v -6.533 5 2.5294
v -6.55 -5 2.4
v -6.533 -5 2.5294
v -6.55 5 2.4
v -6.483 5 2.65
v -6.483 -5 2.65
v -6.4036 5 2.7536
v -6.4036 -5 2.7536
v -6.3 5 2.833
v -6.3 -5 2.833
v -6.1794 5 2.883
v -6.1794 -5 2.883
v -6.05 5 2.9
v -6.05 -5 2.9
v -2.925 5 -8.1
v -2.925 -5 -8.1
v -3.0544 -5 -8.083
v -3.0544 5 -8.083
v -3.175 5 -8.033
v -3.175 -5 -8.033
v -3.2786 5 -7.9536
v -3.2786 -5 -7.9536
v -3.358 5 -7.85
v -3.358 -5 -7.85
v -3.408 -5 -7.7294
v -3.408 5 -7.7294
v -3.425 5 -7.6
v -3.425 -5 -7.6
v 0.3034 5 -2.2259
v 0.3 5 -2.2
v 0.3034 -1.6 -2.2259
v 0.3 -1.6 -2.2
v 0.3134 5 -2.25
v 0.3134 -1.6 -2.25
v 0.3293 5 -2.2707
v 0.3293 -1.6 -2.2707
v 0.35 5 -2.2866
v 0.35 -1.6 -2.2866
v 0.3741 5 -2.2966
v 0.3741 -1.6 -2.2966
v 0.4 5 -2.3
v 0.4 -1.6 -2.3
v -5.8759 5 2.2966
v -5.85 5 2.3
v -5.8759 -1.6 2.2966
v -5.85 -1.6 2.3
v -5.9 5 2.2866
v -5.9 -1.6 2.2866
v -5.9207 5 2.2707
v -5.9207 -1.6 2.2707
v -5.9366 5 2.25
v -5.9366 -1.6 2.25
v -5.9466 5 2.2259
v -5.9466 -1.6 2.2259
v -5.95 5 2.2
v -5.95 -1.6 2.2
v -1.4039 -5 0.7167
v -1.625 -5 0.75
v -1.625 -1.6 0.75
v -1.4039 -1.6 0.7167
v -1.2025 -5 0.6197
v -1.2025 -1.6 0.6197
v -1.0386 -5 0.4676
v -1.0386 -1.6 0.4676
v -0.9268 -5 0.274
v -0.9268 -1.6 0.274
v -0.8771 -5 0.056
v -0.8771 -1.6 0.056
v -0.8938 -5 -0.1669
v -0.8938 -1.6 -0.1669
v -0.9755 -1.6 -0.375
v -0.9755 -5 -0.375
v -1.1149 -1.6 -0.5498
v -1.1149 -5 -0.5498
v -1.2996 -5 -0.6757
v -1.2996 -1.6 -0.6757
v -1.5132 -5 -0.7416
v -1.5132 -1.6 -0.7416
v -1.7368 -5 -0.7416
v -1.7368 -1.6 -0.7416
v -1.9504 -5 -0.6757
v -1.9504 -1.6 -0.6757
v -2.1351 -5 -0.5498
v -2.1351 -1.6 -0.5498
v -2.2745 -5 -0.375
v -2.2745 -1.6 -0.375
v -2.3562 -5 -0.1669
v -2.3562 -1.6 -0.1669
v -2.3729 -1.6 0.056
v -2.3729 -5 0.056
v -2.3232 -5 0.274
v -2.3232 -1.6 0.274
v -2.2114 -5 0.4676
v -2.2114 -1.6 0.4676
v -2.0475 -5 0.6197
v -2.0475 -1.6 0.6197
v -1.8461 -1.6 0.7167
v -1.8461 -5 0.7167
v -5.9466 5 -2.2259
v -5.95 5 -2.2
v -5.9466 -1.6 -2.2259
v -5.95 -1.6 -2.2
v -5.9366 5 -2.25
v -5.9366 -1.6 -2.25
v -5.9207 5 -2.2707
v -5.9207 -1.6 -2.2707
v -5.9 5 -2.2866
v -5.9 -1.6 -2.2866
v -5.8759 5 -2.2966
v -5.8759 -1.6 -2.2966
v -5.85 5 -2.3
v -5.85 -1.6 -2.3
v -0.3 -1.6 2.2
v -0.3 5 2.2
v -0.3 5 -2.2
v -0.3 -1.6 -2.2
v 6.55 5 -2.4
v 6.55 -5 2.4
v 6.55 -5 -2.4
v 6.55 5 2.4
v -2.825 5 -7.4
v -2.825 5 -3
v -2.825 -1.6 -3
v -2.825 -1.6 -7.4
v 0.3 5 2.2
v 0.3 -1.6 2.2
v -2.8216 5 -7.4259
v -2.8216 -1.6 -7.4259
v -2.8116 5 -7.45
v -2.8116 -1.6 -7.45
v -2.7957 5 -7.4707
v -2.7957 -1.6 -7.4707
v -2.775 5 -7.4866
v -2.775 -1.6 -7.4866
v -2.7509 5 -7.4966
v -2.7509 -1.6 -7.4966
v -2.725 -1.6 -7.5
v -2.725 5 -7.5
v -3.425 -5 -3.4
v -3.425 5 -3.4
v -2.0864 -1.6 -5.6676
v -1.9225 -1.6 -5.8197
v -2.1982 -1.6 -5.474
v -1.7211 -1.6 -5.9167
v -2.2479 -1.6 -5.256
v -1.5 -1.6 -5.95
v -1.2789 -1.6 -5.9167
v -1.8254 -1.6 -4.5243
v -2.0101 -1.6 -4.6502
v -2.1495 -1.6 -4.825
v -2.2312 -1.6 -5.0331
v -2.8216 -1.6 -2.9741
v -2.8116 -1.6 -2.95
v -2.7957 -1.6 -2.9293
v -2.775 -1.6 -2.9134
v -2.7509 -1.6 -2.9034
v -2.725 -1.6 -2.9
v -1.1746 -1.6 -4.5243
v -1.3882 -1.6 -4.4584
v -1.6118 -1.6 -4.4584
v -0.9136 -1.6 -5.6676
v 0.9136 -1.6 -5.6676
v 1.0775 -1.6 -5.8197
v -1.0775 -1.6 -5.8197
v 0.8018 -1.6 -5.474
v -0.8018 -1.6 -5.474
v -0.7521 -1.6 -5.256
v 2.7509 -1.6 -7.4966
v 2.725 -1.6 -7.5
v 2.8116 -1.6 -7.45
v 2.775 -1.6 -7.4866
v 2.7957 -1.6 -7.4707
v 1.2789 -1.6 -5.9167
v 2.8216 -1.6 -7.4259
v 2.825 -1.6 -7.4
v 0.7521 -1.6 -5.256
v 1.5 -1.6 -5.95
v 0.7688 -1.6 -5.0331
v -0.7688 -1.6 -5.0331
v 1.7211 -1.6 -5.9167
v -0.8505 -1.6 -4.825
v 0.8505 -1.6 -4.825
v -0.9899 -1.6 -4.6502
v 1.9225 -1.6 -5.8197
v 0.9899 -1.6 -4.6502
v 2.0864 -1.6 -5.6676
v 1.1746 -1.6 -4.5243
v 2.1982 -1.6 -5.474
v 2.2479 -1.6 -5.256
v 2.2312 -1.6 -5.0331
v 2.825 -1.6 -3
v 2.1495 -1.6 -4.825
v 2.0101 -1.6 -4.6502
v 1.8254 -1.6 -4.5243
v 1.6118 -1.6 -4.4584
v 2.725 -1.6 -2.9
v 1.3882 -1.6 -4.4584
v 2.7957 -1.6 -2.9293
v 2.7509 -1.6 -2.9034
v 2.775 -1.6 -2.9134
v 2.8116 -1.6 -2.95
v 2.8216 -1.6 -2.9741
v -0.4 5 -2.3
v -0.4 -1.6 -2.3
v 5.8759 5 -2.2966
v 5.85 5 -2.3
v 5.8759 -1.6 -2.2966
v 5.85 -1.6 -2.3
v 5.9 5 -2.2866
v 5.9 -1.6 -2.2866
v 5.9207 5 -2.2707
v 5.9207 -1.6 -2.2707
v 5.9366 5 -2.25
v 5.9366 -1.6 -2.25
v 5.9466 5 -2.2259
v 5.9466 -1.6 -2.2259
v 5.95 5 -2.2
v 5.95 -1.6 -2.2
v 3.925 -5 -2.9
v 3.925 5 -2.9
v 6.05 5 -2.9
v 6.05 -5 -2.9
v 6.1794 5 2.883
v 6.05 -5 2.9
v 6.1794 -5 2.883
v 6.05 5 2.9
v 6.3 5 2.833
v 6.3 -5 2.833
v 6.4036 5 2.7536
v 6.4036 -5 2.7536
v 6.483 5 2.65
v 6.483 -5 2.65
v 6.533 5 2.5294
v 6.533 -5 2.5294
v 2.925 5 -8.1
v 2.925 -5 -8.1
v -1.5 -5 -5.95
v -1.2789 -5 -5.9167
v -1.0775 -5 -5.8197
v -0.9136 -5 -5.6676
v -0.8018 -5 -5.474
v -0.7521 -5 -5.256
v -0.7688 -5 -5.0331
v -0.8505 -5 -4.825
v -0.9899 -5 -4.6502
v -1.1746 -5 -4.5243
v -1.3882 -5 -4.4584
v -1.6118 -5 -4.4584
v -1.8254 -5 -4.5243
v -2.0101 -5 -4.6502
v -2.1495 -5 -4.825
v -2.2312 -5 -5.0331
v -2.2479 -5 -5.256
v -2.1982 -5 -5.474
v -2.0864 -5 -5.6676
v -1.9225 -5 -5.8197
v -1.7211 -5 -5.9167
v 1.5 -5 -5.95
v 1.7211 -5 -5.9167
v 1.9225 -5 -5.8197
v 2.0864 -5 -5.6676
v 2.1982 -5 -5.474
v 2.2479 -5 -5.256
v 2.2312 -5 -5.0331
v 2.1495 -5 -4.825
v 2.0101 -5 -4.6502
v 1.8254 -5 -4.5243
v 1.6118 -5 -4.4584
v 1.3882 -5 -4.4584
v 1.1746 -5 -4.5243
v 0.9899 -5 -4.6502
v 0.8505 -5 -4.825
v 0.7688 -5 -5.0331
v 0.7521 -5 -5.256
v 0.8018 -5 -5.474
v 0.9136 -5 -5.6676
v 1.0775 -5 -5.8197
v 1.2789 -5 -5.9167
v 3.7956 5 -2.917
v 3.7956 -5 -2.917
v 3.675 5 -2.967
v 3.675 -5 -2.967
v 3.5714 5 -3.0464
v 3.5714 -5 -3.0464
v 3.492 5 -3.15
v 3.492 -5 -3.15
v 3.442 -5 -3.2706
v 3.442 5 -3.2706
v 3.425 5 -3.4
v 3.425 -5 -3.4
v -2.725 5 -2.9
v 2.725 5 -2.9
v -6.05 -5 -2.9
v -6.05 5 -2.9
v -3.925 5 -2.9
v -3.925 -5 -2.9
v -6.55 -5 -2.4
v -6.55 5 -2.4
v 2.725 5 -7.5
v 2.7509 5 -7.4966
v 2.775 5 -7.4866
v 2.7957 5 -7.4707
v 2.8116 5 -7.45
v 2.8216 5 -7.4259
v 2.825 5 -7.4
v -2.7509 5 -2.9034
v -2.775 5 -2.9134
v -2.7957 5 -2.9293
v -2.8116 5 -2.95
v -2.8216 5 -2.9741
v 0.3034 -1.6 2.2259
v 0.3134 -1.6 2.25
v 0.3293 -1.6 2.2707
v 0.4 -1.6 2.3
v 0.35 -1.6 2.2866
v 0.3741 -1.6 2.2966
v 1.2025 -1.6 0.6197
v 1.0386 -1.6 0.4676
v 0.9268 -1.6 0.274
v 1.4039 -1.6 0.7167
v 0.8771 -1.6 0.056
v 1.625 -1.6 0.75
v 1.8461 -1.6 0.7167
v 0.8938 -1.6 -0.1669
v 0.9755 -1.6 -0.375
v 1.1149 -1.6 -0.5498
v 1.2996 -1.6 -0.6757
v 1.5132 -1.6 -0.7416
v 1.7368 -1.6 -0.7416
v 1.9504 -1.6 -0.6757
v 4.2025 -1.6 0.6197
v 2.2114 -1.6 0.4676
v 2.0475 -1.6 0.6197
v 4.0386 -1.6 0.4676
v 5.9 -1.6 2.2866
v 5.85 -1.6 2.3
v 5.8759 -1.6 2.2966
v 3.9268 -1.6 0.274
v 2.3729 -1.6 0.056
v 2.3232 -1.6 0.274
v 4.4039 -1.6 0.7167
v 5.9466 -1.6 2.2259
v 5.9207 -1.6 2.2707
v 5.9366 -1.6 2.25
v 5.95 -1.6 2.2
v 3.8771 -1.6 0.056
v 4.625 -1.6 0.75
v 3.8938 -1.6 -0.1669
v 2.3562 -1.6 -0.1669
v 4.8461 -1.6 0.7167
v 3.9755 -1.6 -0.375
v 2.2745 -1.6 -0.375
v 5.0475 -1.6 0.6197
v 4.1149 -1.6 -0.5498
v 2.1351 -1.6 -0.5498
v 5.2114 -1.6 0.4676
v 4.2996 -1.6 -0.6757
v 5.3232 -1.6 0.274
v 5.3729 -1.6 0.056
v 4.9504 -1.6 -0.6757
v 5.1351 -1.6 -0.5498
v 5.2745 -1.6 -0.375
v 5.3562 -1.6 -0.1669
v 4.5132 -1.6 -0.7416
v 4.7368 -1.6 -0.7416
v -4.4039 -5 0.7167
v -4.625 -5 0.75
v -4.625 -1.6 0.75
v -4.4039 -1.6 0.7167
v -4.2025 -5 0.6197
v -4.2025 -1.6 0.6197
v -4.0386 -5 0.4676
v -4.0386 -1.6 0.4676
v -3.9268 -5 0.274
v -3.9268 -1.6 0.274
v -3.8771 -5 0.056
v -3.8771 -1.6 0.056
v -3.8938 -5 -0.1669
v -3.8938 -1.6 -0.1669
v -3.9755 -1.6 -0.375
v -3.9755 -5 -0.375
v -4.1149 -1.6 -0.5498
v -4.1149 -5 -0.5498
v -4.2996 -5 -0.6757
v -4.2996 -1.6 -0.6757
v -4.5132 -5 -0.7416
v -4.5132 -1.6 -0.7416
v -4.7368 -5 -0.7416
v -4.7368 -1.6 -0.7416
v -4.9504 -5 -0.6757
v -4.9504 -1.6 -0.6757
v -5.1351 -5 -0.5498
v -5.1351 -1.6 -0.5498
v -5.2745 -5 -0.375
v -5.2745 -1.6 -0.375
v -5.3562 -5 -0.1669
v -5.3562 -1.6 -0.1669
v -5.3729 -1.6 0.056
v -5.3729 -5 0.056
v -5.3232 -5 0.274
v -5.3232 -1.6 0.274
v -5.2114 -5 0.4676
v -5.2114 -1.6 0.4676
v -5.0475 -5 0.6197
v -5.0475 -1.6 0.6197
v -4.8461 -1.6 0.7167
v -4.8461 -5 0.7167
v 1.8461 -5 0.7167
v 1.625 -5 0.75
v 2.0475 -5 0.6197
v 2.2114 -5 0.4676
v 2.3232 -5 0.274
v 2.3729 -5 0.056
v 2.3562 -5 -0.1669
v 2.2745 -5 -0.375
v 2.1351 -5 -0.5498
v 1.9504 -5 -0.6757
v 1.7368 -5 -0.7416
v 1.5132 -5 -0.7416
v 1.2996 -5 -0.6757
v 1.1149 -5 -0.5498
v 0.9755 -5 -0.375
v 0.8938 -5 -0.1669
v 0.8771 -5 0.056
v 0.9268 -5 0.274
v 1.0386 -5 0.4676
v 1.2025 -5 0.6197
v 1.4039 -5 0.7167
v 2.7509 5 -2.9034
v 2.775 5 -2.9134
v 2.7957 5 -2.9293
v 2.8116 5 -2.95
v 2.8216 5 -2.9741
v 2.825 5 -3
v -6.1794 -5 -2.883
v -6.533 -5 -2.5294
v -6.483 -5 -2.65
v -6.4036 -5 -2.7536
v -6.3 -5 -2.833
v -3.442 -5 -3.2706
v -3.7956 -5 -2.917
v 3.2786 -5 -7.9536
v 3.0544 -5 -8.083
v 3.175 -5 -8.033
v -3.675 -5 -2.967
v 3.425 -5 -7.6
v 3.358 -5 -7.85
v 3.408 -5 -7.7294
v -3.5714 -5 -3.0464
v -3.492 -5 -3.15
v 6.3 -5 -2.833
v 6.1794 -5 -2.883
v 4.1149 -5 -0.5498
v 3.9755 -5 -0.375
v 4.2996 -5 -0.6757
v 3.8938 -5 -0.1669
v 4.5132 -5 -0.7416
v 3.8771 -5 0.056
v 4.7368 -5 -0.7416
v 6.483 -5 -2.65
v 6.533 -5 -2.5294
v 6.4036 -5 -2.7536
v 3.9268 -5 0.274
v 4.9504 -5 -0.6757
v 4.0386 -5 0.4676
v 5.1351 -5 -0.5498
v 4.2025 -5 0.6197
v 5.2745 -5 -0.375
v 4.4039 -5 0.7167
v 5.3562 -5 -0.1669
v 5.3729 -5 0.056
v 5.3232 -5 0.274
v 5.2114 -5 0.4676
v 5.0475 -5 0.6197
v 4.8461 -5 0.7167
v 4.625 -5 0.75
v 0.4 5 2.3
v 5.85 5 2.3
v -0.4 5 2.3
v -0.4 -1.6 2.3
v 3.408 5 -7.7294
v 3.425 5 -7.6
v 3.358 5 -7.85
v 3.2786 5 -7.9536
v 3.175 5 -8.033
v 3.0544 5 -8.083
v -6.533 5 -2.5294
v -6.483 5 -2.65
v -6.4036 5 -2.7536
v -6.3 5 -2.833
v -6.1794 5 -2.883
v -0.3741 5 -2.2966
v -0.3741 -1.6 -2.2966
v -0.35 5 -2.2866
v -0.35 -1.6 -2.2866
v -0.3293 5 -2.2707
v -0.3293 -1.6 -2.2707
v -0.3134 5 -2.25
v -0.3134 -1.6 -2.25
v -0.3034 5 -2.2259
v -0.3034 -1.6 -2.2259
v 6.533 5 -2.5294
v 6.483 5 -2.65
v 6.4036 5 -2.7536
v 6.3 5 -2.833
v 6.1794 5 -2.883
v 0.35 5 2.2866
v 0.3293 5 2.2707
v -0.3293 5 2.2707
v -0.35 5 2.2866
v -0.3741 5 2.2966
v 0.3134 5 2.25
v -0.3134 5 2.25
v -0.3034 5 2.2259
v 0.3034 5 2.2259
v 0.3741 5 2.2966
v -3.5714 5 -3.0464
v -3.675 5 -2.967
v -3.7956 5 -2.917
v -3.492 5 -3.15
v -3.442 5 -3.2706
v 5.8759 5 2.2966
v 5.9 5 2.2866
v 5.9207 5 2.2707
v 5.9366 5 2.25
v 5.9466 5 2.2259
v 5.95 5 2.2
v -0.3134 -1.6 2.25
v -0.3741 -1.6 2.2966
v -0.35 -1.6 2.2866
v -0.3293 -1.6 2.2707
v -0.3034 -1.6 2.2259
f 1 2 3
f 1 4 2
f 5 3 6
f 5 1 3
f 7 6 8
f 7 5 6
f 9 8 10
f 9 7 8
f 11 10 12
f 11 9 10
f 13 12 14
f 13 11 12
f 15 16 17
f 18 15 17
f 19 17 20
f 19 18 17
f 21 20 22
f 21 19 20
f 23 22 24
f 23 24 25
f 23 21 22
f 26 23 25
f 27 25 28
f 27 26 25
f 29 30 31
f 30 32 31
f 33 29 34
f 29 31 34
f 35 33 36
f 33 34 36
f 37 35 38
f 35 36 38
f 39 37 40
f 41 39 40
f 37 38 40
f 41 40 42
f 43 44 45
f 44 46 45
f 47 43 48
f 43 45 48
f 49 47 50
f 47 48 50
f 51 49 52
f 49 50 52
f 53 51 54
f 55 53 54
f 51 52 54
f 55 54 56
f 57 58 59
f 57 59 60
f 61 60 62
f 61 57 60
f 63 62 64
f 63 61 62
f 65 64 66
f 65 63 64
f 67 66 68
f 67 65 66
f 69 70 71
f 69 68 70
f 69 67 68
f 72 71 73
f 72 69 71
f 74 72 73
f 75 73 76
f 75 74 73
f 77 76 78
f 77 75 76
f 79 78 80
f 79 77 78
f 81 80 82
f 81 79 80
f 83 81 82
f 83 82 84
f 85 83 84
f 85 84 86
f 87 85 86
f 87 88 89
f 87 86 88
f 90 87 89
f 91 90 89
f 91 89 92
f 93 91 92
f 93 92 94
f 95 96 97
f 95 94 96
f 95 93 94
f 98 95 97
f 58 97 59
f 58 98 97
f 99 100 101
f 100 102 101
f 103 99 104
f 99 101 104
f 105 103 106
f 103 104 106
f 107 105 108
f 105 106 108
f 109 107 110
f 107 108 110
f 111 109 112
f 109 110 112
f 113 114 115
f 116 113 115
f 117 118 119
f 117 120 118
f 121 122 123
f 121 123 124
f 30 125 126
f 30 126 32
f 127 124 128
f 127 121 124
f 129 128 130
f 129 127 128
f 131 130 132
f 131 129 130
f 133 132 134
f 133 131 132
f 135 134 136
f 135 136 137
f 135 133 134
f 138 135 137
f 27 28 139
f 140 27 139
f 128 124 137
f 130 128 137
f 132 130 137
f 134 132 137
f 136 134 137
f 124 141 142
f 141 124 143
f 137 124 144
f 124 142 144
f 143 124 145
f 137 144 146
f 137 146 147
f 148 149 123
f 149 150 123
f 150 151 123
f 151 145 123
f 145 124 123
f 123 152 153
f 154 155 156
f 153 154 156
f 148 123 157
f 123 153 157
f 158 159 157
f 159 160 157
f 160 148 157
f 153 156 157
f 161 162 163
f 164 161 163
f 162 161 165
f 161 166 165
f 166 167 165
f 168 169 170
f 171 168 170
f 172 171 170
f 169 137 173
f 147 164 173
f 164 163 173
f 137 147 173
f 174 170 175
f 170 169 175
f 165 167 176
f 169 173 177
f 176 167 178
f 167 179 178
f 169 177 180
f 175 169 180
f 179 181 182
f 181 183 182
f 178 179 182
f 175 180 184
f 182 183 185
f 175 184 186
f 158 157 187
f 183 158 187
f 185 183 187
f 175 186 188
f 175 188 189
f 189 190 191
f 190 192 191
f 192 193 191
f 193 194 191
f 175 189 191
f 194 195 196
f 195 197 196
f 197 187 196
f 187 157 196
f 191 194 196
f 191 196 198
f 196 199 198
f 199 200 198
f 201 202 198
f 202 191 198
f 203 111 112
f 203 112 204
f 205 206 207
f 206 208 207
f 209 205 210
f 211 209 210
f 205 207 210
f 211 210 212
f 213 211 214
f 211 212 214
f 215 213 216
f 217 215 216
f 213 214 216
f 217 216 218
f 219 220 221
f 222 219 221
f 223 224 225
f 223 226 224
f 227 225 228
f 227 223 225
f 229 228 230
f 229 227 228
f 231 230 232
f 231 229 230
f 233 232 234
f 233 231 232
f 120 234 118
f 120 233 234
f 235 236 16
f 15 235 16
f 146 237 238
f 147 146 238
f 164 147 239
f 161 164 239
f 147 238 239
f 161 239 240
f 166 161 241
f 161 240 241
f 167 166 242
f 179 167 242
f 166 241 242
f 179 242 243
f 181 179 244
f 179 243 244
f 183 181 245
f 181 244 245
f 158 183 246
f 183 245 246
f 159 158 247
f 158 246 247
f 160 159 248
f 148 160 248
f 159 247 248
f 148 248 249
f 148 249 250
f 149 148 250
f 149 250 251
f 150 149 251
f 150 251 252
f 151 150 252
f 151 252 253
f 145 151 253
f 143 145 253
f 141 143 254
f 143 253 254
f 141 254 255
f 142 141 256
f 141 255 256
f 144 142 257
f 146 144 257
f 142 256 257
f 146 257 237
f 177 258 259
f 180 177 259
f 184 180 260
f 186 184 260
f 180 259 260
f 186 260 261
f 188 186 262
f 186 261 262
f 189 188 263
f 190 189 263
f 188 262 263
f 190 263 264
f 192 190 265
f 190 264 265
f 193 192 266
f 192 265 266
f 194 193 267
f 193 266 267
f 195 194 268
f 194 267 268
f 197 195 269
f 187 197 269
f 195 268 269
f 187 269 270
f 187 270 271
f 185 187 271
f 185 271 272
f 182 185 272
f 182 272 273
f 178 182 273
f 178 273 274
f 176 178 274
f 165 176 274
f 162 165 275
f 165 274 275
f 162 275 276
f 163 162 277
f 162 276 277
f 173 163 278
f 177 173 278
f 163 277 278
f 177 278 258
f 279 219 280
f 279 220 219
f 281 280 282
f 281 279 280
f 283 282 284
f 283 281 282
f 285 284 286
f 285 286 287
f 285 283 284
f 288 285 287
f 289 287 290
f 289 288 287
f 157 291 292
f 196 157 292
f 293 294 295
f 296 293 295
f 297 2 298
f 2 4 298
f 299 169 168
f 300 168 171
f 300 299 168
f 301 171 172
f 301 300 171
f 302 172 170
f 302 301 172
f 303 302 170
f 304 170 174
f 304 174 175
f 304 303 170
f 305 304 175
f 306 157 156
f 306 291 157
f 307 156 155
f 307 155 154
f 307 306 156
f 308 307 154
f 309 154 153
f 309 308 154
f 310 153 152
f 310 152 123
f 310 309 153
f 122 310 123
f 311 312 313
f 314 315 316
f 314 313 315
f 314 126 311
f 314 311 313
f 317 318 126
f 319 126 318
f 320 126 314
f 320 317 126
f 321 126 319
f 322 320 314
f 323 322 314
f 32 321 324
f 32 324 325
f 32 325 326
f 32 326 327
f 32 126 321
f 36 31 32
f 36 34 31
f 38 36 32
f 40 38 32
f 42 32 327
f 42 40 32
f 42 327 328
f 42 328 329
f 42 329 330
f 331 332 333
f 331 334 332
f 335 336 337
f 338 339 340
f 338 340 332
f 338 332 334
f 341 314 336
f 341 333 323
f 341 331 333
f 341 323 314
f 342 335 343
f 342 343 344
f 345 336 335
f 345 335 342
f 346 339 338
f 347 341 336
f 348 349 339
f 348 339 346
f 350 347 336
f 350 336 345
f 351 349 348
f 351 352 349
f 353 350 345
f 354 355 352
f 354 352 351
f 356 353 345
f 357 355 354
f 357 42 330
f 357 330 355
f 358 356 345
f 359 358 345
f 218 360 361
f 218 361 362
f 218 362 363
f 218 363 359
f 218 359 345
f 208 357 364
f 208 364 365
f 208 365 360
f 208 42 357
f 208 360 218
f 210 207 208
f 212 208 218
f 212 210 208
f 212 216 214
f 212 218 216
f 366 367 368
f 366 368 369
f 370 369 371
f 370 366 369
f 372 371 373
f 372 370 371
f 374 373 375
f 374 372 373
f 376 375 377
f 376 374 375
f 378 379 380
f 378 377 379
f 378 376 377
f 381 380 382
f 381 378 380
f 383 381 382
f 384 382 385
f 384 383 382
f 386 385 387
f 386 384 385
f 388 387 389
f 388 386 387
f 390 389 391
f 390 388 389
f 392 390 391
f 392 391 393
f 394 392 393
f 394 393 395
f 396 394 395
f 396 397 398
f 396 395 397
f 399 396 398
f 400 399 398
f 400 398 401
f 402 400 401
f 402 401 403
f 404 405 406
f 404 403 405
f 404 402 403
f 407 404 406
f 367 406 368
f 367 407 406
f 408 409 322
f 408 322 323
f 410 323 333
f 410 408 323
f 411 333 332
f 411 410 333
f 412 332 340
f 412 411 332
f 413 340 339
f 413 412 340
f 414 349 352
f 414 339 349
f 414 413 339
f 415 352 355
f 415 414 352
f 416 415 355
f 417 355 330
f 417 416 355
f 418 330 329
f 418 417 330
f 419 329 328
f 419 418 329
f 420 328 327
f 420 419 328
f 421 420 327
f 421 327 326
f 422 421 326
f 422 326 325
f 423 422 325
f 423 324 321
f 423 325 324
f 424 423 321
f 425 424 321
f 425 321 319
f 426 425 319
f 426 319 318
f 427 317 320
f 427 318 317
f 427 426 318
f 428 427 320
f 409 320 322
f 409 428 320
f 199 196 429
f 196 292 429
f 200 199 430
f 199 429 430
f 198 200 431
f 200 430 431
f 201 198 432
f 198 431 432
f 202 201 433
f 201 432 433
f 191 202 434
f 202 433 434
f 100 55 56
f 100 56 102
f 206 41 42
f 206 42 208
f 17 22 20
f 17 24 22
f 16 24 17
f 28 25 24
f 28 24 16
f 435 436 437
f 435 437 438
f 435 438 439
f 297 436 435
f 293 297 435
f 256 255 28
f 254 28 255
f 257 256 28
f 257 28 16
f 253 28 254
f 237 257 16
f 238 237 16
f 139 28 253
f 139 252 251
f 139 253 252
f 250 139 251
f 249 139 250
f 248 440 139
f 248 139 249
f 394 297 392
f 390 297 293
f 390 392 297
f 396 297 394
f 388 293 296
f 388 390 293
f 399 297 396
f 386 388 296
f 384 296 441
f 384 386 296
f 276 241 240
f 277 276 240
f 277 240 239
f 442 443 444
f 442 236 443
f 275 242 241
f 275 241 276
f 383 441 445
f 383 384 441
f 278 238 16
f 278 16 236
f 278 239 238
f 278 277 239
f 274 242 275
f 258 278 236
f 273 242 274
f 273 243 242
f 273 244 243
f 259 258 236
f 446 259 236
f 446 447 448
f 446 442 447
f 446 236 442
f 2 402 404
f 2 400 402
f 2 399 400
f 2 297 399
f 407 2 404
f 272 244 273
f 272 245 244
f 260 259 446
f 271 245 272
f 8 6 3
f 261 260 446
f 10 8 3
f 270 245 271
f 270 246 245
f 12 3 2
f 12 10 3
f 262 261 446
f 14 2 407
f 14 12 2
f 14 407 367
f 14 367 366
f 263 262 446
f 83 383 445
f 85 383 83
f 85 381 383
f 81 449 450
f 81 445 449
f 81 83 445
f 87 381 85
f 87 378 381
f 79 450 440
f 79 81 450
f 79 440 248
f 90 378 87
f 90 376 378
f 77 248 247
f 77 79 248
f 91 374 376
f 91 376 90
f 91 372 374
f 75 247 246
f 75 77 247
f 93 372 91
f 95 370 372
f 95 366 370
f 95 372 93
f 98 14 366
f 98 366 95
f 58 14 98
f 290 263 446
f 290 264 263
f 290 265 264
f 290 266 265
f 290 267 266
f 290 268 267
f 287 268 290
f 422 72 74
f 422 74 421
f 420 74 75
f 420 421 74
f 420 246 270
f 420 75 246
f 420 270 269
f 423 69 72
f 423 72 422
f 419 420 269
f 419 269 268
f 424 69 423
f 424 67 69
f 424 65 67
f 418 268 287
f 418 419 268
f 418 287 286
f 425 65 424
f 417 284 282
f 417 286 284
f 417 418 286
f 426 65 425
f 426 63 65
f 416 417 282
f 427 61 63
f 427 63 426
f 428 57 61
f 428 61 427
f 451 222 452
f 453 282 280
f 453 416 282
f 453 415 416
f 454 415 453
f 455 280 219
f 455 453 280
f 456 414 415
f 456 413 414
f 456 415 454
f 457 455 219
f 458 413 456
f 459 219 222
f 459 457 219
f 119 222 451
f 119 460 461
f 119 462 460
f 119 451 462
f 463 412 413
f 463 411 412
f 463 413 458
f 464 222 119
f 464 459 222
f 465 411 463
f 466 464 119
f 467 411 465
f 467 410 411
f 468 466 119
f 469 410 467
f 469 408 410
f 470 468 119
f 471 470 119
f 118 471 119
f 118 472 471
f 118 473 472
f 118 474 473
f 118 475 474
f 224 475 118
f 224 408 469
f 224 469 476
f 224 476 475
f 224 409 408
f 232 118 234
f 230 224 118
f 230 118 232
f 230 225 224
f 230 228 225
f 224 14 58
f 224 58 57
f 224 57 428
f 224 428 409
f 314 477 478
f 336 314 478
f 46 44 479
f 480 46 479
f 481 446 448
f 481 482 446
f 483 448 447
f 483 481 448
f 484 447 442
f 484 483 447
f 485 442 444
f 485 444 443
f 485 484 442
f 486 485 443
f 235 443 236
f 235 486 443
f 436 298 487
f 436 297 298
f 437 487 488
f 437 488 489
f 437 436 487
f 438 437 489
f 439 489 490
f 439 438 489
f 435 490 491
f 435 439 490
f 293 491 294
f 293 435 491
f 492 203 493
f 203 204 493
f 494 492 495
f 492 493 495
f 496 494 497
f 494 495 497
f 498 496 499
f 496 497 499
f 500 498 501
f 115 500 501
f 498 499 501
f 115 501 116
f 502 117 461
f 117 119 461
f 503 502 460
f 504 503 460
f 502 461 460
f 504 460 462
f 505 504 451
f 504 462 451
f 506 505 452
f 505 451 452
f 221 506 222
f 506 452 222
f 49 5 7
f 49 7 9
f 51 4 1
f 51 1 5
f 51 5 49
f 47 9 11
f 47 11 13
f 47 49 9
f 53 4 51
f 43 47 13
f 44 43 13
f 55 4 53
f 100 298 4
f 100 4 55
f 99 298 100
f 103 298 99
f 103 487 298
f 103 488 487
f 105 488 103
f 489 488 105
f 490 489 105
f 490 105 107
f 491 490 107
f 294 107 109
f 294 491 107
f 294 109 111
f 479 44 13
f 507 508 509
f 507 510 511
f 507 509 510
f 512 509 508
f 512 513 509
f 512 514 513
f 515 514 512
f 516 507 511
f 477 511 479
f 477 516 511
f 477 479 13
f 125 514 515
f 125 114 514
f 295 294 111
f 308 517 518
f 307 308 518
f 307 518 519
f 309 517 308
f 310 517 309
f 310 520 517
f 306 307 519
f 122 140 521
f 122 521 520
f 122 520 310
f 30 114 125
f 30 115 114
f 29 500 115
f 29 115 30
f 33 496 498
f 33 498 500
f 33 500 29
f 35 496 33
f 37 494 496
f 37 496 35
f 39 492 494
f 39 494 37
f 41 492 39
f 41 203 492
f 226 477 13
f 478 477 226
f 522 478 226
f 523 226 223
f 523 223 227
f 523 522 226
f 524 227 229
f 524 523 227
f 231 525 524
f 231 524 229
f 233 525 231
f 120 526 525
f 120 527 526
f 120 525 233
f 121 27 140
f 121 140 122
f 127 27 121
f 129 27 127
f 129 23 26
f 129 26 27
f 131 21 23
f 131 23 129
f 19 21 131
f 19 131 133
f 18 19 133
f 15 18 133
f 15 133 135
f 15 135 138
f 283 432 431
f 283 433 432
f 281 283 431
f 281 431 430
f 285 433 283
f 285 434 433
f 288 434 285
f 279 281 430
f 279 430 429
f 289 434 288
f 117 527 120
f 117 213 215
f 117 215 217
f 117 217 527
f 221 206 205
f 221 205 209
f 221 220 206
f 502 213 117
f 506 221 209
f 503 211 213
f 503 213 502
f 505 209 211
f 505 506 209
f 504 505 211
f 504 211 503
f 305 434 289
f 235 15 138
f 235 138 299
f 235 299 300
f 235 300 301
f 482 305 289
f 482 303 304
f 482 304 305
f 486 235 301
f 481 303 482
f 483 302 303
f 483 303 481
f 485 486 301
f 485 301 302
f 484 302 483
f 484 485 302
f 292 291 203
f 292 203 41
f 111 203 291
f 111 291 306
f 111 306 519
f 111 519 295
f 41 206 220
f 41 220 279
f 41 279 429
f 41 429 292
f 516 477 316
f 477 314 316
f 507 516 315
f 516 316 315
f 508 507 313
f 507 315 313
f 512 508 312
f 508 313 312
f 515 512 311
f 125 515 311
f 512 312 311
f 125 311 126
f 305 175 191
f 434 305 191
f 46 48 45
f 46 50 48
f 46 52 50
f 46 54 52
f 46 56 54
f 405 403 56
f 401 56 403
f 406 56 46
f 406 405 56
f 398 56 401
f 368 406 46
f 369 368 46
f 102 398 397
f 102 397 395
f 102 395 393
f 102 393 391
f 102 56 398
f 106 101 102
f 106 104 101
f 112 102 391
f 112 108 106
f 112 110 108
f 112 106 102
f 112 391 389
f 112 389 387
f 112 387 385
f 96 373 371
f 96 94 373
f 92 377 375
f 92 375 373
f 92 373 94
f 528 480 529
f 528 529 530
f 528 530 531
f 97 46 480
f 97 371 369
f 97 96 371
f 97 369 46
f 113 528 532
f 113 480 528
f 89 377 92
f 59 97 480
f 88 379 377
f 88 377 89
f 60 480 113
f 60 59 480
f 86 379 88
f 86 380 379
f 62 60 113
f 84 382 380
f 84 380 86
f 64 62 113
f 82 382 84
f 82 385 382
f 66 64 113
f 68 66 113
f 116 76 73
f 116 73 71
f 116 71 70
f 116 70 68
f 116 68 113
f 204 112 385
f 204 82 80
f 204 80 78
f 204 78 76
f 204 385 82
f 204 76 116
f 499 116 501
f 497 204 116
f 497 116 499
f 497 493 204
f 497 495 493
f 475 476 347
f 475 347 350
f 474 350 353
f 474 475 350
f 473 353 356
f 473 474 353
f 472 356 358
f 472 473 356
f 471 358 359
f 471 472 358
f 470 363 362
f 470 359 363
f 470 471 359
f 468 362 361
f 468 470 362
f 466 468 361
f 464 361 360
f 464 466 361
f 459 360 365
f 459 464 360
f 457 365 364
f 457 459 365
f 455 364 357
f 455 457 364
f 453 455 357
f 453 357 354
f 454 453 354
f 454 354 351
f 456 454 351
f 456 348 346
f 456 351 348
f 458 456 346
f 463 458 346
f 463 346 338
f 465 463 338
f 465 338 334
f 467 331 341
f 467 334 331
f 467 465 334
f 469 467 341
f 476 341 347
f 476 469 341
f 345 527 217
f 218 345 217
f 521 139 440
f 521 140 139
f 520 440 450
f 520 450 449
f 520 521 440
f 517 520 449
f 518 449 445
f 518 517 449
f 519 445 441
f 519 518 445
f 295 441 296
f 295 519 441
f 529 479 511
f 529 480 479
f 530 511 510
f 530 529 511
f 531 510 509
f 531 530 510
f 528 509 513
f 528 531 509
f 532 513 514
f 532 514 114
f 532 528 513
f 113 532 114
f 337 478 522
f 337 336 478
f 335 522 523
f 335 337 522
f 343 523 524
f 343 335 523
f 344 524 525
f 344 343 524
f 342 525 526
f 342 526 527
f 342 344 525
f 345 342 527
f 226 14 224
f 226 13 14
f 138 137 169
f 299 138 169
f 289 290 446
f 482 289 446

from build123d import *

# Parameters (mm, degrees)
SKETCH1_W               = 13.1
SKETCH1_H               = 5.8
BOSS_EXTRUDE1_DEPTH     = 5
SKETCH10_W              = 5.65
SKETCH10_H              = 4.6
CUT_EXTRUDE7_DEPTH      = 6.6
CUT_EXTRUDE6_DEPTH      = 9.735702605
CUT_EXTRUDE6_DEPTH_BACK = 9.735702605
SKETCH9_R               = 0.75
BOSS_EXTRUDE2_START     = -5
BOSS_EXTRUDE2_DEPTH     = 10
SKETCH12_W              = 5.65
SKETCH12_H              = 4.6
SKETCH12_R              = 0.75
BOSS_EXTRUDE3_DEPTH     = 3.4
FILETE1_R               = 0.5
FILETE2_R               = 0.1


with BuildPart() as part:
    # Sketch1 → Boss-Extrude1 (new, symmetric)
    with BuildSketch(Plane(origin=(0, 0, 0), x_dir=(1, 0, 0), z_dir=(0, 1, 0))):
        Rectangle(SKETCH1_W, SKETCH1_H)
    extrude(amount=BOSS_EXTRUDE1_DEPTH, both=True)

    # Sketch10 → Cut-Extrude7 (cut)
    with BuildSketch(Plane(origin=(0, 5, 0), x_dir=(1, 0, 0), z_dir=(0, 1, 0))):
        with Locations((-3.125, 0)):
            Rectangle(SKETCH10_W, SKETCH10_H)
        with Locations((3.125, 0)):
            Rectangle(SKETCH10_W, SKETCH10_H)
    extrude(amount=-CUT_EXTRUDE7_DEPTH, mode=Mode.SUBTRACT)

    # Sketch9 → Cut-Extrude6 (cut, two sides: drawn at the far end of the back side and taken through both)
    with BuildSketch(Plane(origin=(0, 0, 0), x_dir=(1, 0, 0), z_dir=(0, 1, 0)).offset(-CUT_EXTRUDE6_DEPTH_BACK)):
        with Locations(Location((-4.625, 0, 0), (0, 0, 270))):
            Circle(SKETCH9_R)
        with Locations(Location((-1.625, 0, 0), (0, 0, 270))):
            Circle(SKETCH9_R)
        with Locations(Location((1.625, 0, 0), (0, 0, 270))):
            Circle(SKETCH9_R)
        with Locations(Location((4.625, 0, 0), (0, 0, 270))):
            Circle(SKETCH9_R)
    extrude(amount=CUT_EXTRUDE6_DEPTH + CUT_EXTRUDE6_DEPTH_BACK, mode=Mode.SUBTRACT)

    # Sketch11 → Boss-Extrude2 (add)
    with BuildSketch(Plane(origin=(0, 0, 0), x_dir=(1, 0, 0), z_dir=(0, 1, 0)).offset(BOSS_EXTRUDE2_START)):
        Polygon((-3.425, 8.1), (-3.425, 2.9), (-2.825, 2.9), (-2.825, 7.5), (2.825, 7.5), (2.825, 2.9), (3.425, 2.9), (3.425, 8.1), align=None)
    extrude(amount=BOSS_EXTRUDE2_DEPTH)

    # Sketch12 → Boss-Extrude3 (add)
    with BuildSketch(Plane.XZ.offset(5)):
        with Locations((0, -5.2)):
            Rectangle(SKETCH12_W, SKETCH12_H)
        with Locations(Location((-1.5, -5.2, 0), (0, 0, 270))):
            Circle(SKETCH12_R, mode=Mode.SUBTRACT)
        with Locations(Location((1.5, -5.2, 0), (0, 0, 270))):
            Circle(SKETCH12_R, mode=Mode.SUBTRACT)
    extrude(amount=-BOSS_EXTRUDE3_DEPTH)

    # Filete1
    filete1_edges = [part.edges().sort_by_distance(p)[0] for p in [
        (-6.55, 0, -2.9),
        (-3.425, 0, -2.9),
        (-3.425, 0, -8.1),
        (3.425, 0, -8.1),
        (6.55, 0, -2.9),
        (3.425, 0, -2.9),
        (6.55, 0, 2.9),
        (-6.55, 0, 2.9),
    ]]
    fillet(filete1_edges, radius=FILETE1_R)

    # Filete2
    filete2_edges = [part.edges().sort_by_distance(p)[0] for p in [
        (-5.95, 1.7, 2.3),
        (-5.95, 1.7, -2.3),
        (-0.3, 1.7, -2.3),
        (-0.3, 1.7, 2.3),
        (5.95, 1.7, 2.3),
        (0.3, 1.7, 2.3),
        (0.3, 1.7, -2.3),
        (5.95, 1.7, -2.3),
        (2.825, 1.7, -7.5),
        (-2.825, 1.7, -7.5),
        (-2.825, 1.7, -2.9),
        (2.825, 1.7, -2.9),
    ]]
    fillet(filete2_edges, radius=FILETE2_R)


solid = part.part
